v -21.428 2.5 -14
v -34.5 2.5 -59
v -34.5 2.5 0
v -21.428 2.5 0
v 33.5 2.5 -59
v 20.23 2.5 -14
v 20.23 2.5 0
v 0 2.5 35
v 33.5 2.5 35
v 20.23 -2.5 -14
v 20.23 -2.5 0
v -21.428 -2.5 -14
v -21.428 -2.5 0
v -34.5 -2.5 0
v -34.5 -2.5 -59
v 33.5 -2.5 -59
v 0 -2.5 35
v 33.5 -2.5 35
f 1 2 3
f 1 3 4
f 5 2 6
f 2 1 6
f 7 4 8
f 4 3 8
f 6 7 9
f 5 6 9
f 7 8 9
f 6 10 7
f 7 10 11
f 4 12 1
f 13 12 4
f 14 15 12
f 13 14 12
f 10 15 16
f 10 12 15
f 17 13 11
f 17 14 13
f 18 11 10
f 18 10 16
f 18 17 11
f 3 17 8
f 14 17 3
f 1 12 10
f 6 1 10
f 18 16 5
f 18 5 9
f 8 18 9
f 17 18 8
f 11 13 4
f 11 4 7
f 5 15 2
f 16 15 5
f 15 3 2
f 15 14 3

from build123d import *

# Parameters (mm, degrees)
F1_DEPTH = 2.5
F2_W     = 41.65861
F2_H     = 13.999665
F3_DEPTH = 25


with BuildPart() as f1:
    # F0 (on Front) → F1 (new body, symmetric)
    with BuildSketch(Plane.XZ):
        Polygon((-34.5, 0), (-34.5, -59), (33.5, -59), (33.5, 35), (0, 35), align=None)
    extrude(amount=F1_DEPTH, both=True)

    # F2 (on face) → F3 (cut)
    with BuildSketch(Plane.XZ.offset(2.5)):
        with Locations((-0.598928, -6.999833)):
            Rectangle(F2_W, F2_H)
    extrude(amount=-F3_DEPTH, mode=Mode.SUBTRACT)


solid = f1.part
